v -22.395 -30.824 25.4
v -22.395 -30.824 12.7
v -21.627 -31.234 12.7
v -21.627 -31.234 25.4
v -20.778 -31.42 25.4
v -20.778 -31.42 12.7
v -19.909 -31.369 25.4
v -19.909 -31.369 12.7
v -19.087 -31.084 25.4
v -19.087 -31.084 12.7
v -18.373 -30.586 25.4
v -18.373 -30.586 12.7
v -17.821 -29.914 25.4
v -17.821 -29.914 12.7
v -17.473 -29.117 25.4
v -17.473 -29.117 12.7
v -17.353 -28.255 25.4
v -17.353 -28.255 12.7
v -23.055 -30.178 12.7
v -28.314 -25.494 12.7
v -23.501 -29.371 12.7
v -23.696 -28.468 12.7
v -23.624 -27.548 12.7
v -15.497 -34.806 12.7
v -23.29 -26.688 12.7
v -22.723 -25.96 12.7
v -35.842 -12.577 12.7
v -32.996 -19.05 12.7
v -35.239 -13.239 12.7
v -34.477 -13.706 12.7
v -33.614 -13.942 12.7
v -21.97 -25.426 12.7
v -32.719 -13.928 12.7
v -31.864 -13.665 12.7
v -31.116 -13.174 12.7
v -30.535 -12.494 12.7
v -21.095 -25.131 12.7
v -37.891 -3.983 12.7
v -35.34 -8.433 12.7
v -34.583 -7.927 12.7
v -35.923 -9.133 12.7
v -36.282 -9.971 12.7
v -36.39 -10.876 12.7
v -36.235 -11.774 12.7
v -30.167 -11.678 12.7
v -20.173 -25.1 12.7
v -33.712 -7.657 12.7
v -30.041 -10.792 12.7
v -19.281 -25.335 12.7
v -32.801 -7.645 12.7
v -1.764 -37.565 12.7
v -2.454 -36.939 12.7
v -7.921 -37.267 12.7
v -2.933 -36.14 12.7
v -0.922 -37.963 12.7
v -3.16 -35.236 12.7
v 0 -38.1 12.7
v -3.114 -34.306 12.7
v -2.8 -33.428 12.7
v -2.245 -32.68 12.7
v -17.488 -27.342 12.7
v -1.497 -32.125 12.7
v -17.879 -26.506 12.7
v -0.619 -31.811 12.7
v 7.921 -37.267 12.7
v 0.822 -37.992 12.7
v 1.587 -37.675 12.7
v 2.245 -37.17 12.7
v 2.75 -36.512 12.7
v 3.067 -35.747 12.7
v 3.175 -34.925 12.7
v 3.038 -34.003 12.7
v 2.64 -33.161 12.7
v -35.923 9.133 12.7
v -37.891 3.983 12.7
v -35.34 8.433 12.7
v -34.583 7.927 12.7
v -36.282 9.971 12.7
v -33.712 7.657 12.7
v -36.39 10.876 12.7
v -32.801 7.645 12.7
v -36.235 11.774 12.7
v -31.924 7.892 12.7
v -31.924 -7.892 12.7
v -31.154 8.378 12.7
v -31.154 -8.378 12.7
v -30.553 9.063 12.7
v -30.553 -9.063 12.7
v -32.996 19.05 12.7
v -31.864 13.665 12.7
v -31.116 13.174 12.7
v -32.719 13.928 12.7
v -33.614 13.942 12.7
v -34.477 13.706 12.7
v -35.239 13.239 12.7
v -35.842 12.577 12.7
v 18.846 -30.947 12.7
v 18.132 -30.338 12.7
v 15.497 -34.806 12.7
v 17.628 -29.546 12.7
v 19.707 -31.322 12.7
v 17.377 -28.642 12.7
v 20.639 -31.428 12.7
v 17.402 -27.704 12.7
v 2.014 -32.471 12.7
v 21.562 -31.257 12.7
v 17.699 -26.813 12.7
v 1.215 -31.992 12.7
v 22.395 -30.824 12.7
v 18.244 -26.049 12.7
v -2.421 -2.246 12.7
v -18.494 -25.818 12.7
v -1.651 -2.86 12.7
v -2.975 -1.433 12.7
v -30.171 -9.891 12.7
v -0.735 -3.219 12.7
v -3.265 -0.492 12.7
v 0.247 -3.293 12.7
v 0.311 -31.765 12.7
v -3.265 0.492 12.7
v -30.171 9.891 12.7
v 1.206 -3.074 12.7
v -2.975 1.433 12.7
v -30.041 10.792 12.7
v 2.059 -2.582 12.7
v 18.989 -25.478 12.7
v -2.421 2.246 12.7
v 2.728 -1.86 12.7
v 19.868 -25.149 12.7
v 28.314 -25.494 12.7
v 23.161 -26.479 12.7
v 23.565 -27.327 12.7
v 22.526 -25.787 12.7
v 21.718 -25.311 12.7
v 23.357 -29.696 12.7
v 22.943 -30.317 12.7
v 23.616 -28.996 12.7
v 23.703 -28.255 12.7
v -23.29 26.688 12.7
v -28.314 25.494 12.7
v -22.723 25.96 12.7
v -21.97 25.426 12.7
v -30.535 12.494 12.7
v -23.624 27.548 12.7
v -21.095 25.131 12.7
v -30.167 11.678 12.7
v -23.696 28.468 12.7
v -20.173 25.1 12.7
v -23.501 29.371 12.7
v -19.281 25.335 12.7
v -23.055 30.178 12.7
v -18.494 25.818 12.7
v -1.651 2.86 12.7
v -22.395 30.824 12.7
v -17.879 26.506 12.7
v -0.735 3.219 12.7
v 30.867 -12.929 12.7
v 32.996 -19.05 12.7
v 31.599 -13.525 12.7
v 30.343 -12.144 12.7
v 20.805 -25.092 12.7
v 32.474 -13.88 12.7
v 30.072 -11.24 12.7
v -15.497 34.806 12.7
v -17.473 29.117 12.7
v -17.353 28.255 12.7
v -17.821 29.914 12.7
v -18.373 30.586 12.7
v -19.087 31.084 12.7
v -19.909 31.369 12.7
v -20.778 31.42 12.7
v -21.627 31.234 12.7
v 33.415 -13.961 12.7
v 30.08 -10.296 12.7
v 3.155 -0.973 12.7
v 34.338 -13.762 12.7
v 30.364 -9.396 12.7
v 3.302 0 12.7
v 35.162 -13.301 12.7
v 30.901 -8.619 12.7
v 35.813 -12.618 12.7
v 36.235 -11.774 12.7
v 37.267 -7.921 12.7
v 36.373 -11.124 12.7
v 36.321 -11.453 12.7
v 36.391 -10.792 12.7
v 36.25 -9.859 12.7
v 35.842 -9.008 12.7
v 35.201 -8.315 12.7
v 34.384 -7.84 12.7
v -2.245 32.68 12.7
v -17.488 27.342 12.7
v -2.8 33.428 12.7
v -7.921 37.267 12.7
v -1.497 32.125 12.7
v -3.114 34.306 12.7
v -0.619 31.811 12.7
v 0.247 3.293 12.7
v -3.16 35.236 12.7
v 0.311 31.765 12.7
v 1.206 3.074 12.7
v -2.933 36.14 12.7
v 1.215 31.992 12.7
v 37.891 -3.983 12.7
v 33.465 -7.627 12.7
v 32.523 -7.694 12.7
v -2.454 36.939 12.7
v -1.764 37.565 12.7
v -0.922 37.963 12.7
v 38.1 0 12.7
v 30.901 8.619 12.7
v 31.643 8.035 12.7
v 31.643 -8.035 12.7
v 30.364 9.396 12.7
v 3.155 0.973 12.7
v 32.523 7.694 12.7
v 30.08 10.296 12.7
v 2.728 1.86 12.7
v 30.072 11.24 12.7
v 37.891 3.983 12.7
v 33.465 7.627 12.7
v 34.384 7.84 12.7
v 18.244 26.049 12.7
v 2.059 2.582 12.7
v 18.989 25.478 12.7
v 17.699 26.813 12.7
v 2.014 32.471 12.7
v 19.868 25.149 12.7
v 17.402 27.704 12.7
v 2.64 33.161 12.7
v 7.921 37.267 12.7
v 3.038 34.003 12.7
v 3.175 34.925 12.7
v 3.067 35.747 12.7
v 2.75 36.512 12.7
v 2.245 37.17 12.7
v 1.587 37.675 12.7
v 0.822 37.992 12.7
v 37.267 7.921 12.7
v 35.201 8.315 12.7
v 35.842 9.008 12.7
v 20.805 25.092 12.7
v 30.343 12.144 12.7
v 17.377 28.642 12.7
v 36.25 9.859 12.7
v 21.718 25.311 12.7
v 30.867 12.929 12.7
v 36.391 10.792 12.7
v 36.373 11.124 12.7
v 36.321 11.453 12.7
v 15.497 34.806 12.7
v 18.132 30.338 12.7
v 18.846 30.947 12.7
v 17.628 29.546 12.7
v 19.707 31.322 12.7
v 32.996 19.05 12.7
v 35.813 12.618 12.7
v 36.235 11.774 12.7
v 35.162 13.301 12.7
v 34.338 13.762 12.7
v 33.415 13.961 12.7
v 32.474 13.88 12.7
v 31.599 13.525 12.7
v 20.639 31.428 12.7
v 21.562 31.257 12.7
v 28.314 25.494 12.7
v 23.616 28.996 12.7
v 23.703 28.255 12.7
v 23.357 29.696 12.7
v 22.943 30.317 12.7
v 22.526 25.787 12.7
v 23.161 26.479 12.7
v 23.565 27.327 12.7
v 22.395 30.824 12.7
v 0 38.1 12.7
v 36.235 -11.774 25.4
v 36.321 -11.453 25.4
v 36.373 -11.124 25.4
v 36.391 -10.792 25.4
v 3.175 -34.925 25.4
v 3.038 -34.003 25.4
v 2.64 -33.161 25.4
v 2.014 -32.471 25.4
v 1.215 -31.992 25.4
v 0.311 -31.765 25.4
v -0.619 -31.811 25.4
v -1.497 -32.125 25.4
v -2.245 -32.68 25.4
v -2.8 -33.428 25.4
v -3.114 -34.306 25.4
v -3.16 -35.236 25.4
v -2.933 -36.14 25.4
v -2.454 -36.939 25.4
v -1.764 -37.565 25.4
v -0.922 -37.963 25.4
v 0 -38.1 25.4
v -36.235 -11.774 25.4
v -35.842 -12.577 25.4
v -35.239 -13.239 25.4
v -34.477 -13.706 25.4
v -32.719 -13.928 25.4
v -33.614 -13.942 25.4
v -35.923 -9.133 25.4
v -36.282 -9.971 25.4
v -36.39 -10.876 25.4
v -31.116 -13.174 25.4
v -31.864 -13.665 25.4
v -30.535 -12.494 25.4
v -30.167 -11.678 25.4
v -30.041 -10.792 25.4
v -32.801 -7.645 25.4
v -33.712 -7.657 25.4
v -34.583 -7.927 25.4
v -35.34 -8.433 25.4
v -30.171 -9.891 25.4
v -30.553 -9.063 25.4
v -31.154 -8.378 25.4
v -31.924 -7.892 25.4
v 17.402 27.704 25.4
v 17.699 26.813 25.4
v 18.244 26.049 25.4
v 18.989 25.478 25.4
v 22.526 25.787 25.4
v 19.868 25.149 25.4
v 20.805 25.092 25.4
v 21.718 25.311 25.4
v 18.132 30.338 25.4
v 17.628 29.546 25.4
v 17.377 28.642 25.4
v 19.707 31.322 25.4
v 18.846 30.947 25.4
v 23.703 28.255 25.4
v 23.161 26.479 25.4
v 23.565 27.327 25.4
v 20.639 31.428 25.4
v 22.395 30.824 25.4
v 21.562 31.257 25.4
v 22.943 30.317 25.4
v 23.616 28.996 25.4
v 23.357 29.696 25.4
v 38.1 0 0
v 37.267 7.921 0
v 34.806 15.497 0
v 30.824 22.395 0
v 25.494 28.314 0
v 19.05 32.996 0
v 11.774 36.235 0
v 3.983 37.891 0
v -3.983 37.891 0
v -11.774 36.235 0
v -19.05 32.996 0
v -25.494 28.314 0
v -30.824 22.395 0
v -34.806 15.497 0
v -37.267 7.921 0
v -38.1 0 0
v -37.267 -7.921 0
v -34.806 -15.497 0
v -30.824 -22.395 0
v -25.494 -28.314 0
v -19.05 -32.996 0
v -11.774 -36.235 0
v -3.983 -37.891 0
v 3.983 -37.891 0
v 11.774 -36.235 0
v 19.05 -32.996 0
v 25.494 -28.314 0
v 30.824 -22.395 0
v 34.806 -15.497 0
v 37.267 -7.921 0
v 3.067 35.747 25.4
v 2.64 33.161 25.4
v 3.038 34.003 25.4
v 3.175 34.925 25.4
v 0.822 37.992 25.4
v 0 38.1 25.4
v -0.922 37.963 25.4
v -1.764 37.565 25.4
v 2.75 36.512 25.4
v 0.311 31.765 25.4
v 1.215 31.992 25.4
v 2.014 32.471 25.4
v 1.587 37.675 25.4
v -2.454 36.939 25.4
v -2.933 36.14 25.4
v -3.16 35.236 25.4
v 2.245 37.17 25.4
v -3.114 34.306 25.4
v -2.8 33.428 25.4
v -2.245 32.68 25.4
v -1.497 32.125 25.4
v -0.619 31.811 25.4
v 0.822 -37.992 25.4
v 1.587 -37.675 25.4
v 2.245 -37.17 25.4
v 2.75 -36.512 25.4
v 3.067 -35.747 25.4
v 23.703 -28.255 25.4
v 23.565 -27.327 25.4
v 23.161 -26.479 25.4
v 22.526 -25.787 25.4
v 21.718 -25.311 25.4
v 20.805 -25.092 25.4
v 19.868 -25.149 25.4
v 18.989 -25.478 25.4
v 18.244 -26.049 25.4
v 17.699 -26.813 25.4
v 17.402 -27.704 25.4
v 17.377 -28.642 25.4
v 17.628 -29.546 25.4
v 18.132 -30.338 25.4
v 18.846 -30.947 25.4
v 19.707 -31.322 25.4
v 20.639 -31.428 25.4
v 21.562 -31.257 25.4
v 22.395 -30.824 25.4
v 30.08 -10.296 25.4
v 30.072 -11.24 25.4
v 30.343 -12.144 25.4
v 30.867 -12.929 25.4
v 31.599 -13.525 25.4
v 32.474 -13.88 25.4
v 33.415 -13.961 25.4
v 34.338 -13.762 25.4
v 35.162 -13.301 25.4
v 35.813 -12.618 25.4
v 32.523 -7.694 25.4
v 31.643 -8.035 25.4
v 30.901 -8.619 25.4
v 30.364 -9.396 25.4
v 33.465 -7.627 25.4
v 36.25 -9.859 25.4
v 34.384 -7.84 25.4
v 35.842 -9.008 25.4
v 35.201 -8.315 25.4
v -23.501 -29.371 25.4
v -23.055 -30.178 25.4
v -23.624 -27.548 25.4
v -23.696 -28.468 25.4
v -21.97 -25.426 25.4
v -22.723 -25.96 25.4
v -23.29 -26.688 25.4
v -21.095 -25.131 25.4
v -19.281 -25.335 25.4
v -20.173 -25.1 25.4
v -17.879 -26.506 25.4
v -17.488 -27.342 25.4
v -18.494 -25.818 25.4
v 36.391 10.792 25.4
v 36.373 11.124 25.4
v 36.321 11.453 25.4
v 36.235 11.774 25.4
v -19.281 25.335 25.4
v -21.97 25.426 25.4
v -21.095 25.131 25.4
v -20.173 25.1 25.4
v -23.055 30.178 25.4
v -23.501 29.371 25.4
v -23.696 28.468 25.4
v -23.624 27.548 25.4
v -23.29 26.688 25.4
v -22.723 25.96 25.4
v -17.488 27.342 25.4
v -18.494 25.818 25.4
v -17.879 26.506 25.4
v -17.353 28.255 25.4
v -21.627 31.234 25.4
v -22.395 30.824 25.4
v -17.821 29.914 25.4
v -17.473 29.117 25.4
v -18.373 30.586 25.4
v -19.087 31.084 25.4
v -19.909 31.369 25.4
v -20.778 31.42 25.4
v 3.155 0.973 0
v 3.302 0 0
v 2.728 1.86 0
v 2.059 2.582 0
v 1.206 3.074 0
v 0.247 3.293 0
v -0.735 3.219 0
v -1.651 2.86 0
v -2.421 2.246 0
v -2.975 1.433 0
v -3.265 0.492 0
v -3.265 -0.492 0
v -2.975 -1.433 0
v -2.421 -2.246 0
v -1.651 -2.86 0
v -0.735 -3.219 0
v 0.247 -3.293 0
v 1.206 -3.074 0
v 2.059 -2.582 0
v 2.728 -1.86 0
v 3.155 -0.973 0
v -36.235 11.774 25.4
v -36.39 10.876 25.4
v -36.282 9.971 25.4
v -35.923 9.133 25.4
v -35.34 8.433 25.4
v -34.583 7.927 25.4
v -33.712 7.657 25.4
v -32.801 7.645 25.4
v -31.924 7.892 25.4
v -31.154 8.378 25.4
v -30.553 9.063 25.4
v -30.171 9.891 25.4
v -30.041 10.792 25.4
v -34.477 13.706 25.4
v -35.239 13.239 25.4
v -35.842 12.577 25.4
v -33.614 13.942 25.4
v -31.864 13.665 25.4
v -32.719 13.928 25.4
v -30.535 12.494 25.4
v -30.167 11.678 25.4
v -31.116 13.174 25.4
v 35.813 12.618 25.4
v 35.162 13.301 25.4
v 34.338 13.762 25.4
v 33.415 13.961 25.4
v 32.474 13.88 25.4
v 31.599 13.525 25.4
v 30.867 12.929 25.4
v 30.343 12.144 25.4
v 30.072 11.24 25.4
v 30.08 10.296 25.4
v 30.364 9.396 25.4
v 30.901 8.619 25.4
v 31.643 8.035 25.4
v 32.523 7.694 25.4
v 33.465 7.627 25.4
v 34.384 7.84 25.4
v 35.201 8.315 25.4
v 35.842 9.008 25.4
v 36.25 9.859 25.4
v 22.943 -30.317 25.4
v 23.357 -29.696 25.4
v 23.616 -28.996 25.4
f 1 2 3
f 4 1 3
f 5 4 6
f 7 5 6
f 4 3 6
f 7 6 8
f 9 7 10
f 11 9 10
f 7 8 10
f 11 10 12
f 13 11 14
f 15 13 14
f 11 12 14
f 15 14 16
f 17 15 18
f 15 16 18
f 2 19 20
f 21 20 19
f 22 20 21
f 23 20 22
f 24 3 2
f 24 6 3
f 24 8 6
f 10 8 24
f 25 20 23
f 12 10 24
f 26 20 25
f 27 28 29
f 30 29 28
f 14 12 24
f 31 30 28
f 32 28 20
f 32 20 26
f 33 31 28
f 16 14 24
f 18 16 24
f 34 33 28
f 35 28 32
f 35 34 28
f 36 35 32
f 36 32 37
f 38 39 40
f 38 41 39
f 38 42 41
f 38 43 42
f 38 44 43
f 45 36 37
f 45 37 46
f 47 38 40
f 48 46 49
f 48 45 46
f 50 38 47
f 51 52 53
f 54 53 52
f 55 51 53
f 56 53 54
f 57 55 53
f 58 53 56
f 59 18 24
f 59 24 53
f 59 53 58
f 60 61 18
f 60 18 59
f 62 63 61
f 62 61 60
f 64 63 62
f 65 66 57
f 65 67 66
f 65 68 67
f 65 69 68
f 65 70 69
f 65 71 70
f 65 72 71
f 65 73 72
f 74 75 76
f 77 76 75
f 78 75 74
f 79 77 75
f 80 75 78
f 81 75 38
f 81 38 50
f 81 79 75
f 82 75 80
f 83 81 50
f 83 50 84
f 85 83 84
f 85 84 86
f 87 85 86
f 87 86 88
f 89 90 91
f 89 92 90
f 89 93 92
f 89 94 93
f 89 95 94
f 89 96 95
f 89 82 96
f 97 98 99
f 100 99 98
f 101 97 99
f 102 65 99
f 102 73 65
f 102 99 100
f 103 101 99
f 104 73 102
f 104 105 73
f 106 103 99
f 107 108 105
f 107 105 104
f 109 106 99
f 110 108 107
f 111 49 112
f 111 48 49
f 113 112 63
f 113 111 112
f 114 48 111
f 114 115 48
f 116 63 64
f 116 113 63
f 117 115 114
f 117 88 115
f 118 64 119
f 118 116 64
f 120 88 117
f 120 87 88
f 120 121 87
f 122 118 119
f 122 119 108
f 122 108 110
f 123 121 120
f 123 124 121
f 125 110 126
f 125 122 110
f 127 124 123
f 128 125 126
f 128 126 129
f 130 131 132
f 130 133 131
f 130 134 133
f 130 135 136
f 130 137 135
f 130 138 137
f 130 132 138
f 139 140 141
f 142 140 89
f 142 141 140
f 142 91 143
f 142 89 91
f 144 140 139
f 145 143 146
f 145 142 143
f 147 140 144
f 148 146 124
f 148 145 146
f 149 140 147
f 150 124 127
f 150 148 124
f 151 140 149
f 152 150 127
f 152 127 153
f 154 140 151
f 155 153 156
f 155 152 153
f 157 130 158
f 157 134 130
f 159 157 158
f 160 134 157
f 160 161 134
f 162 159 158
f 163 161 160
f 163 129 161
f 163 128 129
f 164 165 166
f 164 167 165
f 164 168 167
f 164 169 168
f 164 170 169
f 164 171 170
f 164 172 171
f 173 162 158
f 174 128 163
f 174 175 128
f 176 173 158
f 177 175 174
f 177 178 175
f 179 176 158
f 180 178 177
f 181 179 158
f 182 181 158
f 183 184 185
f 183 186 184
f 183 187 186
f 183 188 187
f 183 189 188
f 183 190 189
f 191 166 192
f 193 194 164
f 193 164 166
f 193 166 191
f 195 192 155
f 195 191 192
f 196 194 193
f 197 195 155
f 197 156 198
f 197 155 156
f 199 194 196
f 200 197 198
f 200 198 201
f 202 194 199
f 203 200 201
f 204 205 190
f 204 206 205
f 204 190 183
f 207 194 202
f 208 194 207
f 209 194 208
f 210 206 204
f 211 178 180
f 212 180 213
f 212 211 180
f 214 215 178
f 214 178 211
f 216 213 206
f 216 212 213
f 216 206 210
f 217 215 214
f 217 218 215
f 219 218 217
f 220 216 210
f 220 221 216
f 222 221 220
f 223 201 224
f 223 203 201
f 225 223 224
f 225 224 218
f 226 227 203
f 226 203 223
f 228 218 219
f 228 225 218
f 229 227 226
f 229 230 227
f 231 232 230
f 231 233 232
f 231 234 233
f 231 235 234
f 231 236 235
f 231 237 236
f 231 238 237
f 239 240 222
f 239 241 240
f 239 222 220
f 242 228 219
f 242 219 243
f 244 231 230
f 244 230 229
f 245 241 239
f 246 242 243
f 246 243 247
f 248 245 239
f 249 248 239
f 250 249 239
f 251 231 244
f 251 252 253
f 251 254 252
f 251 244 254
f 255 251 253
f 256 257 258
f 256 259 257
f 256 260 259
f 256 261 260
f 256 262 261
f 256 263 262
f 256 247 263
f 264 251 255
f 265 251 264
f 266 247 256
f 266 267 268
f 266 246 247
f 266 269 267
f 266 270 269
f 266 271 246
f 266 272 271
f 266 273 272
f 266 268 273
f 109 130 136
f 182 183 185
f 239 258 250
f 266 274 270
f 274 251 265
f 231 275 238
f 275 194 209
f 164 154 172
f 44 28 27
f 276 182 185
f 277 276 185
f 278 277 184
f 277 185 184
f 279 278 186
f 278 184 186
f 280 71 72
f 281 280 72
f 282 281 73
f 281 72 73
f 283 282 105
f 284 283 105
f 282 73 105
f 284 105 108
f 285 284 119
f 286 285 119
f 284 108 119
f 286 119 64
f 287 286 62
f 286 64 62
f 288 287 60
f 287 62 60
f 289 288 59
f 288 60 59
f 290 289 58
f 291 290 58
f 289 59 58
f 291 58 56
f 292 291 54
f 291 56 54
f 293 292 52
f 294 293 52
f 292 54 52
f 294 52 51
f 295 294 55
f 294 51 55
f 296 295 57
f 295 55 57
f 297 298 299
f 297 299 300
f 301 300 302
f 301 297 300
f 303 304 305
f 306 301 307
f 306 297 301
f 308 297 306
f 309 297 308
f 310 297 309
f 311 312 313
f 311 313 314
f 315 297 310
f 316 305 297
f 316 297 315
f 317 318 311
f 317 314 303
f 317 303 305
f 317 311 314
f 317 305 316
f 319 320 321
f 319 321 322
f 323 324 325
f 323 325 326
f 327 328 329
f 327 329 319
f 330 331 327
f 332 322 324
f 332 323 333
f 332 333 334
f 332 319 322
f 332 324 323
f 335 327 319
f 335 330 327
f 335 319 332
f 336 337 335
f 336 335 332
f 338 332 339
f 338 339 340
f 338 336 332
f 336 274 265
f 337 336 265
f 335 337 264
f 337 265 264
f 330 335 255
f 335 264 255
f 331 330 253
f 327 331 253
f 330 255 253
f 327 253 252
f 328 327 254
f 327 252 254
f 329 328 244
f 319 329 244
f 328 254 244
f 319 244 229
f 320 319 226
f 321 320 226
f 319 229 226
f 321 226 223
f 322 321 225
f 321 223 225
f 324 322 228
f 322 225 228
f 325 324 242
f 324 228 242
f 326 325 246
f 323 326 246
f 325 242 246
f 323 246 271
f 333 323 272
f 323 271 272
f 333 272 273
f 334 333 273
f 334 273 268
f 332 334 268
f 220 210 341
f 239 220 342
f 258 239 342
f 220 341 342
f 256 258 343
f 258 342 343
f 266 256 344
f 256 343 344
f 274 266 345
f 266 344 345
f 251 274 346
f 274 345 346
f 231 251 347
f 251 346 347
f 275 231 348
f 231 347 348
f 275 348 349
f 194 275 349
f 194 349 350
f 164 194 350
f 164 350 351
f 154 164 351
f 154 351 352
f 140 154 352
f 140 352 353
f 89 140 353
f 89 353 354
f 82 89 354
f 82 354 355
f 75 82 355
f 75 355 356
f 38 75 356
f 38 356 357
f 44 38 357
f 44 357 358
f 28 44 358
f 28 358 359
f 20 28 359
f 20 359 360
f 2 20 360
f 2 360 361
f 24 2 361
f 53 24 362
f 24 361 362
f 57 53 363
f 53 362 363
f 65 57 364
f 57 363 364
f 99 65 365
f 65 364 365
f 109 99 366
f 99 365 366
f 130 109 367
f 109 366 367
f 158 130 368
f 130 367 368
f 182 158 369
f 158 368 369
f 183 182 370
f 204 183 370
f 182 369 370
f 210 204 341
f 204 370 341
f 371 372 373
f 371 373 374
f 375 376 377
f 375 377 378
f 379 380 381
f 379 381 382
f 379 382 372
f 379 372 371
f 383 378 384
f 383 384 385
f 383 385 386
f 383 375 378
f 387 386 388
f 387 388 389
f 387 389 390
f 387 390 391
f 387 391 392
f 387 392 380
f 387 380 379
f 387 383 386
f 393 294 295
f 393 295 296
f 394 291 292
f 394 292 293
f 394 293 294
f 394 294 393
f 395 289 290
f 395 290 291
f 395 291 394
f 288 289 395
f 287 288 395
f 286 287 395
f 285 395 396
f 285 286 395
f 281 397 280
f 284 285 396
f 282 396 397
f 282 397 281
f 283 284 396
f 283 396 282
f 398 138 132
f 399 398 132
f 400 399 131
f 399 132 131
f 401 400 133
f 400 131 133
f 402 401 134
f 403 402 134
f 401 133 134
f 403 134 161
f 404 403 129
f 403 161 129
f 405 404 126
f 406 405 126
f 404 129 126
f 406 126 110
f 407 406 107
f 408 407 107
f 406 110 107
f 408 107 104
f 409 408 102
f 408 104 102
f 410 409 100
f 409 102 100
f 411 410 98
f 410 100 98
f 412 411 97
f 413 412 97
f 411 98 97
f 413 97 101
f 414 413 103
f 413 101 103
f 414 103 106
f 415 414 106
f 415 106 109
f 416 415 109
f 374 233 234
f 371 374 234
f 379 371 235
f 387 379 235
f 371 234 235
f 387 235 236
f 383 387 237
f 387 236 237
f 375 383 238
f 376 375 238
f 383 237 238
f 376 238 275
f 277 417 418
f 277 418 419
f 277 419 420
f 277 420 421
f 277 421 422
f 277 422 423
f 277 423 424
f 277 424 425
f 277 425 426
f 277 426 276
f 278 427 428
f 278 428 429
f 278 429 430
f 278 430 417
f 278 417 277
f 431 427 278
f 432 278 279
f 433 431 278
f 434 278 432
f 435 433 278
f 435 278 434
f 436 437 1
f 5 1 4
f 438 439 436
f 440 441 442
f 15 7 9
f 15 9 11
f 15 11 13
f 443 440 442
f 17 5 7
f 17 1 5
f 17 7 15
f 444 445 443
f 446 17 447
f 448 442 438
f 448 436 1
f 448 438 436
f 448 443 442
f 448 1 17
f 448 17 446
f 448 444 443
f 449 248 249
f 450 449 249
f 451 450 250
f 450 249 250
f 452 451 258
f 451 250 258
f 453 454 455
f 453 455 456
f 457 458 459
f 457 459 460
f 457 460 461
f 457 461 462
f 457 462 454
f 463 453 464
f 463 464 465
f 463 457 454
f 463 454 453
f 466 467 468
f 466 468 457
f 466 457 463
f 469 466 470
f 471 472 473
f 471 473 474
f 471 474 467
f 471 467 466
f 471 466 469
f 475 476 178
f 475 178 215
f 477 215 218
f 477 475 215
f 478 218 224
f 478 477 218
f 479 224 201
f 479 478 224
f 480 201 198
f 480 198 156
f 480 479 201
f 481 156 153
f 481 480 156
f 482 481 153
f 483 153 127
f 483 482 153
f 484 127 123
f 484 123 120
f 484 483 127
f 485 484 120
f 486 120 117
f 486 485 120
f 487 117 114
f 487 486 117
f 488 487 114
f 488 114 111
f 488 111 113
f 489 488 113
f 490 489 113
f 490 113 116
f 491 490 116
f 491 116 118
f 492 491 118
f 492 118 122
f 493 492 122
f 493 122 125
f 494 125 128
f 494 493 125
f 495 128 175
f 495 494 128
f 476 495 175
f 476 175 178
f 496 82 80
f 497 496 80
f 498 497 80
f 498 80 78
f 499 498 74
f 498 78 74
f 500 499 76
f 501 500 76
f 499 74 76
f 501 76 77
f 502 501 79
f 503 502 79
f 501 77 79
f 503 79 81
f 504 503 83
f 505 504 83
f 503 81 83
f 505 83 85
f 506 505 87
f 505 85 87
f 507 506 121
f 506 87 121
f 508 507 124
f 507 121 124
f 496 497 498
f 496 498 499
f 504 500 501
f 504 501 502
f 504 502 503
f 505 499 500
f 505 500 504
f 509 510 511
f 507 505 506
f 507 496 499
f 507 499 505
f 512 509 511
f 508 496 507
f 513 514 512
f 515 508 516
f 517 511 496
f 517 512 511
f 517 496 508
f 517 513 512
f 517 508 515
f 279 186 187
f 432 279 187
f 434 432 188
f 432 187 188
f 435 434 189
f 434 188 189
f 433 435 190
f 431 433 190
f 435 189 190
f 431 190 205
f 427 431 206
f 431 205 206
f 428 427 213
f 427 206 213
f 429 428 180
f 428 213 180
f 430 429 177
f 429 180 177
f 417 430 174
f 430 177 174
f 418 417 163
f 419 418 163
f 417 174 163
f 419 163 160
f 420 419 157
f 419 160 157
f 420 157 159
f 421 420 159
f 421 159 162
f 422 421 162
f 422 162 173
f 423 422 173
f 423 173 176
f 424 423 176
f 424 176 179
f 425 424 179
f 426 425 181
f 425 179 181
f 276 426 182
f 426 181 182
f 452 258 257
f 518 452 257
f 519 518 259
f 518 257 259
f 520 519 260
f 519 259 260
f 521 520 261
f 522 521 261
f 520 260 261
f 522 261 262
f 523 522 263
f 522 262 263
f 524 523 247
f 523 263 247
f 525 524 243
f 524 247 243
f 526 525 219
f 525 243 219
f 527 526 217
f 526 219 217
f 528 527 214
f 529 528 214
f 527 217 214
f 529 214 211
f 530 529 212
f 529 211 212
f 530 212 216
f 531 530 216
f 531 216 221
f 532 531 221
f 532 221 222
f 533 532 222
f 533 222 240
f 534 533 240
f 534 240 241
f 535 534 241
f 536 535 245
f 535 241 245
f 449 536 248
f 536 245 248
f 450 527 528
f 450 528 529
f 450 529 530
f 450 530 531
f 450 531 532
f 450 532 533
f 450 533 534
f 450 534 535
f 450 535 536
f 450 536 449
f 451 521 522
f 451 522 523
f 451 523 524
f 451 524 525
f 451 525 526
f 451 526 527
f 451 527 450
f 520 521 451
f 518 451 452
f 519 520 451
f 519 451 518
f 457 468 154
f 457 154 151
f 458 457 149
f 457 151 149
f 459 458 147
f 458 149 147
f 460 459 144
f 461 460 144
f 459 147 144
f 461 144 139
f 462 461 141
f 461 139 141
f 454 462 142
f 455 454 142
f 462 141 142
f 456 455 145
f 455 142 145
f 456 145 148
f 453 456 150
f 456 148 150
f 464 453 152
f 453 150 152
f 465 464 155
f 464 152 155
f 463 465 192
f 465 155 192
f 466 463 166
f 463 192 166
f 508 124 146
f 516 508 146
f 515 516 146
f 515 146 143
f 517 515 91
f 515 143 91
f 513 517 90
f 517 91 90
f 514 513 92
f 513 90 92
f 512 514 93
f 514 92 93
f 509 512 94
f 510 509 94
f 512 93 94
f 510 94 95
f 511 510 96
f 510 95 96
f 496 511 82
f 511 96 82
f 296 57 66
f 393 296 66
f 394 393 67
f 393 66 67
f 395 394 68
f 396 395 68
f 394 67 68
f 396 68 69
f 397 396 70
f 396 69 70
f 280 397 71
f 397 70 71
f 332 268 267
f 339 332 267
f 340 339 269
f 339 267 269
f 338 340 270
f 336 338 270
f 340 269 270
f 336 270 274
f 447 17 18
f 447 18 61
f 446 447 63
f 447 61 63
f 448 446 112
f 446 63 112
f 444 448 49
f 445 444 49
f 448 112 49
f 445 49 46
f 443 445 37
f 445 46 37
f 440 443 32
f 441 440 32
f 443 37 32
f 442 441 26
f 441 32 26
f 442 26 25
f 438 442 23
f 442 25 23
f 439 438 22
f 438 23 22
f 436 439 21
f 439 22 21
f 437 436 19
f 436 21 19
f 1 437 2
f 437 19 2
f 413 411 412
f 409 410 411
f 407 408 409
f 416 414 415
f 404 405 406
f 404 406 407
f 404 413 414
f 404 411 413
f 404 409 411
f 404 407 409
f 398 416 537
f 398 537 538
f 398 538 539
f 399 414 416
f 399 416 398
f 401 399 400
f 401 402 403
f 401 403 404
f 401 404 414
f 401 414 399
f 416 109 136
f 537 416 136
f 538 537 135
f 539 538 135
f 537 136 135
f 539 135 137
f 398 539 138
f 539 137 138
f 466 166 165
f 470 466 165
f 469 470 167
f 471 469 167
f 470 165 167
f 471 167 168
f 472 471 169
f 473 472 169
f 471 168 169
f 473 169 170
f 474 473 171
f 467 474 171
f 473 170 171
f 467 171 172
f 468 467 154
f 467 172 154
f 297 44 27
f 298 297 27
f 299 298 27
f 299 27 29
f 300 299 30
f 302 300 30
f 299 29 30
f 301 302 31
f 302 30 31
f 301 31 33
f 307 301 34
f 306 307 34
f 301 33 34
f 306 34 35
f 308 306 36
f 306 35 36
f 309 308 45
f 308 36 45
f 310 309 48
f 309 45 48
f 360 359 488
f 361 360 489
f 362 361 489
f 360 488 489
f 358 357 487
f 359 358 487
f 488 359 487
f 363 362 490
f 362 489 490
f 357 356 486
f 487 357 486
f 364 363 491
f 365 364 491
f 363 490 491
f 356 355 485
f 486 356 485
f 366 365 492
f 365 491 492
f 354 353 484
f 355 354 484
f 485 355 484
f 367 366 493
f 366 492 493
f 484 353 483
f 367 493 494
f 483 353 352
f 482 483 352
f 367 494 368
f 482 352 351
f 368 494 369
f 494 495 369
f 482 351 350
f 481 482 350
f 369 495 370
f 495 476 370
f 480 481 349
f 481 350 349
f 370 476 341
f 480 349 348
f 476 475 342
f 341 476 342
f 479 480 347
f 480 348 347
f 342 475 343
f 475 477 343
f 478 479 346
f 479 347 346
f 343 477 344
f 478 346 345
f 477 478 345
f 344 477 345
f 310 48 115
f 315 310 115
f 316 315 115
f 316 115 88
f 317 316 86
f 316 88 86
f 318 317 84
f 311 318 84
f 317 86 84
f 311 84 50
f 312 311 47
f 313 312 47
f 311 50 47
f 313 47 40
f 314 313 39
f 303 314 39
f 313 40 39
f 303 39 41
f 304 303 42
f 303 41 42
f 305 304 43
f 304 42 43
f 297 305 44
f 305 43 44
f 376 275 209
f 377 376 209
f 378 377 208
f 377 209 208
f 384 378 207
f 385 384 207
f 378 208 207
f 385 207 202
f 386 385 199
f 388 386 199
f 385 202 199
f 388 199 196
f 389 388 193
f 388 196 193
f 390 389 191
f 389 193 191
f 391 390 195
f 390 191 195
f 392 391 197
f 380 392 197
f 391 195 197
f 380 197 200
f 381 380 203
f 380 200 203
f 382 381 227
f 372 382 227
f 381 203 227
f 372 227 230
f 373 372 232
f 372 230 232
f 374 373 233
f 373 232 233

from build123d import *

# Parameters (mm, degrees)
F0_R     = 38.1
F0_R_2   = 3.302
F1_DEPTH = 12.7
F3_DEPTH = 12.7
F4_DEPTH = 12.7


with BuildPart() as f1:
    # F0 (on Top) → F1 (new body)
    with BuildSketch(Plane.XY):
        Circle(F0_R)
        Circle(F0_R_2, mode=Mode.SUBTRACT)
    extrude(amount=F1_DEPTH)

    # F2 (on face) → F3 (join)
    with BuildSketch(Plane.XY.offset(12.7)):
        with BuildLine():
            ThreePointArc((23.7034, 28.254919), (23.357346, 29.696338), (22.394618, 30.823547))
            ThreePointArc((22.394618, 30.823547), (17.699454, 26.813499), (23.7034, 28.254919))
        make_face()
        with BuildLine():
            ThreePointArc((36.390649, 10.792419), (36.351559, 11.289098), (36.235253, 11.773548))
            ThreePointArc((36.235253, 11.773548), (30.079738, 10.295739), (36.390649, 10.792419))
        make_face()
        with BuildLine():
            ThreePointArc((36.390649, -10.792419), (30.079738, -10.295739), (36.235253, -11.773548))
            ThreePointArc((36.235253, -11.773548), (36.351559, -11.289098), (36.390649, -10.792419))
        make_face()
        with BuildLine():
            ThreePointArc((23.7034, -28.254919), (17.699454, -26.813499), (22.394618, -30.823547))
            ThreePointArc((22.394618, -30.823547), (23.357346, -29.696338), (23.7034, -28.254919))
        make_face()
    extrude(amount=F3_DEPTH)

    # F2 (on face) → F4 (join)
    with BuildSketch(Plane.XY.offset(12.7)):
        with BuildLine():
            ThreePointArc((0, 38.1), (-2.245064, 32.679936), (3.175, 34.925))
            ThreePointArc((3.175, 34.925), (2.245064, 37.170064), (0, 38.1))
        make_face()
        with BuildLine():
            ThreePointArc((-17.3534, 28.254919), (-19.08698, 31.083864), (-22.394618, 30.823547))
            ThreePointArc((-22.394618, 30.823547), (-21.96982, 25.425973), (-17.3534, 28.254919))
        make_face()
        with BuildLine():
            ThreePointArc((-30.040649, 10.792419), (-32.718969, 13.928329), (-36.235253, 11.773547))
            ThreePointArc((-36.235253, 11.773547), (-33.712328, 7.656508), (-30.040649, 10.792419))
        make_face()
        with BuildLine():
            ThreePointArc((-30.040649, -10.792419), (-33.712328, -7.656508), (-36.235253, -11.773547))
            ThreePointArc((-36.235253, -11.773547), (-32.71897, -13.928329), (-30.040649, -10.792419))
        make_face()
        with BuildLine():
            ThreePointArc((-17.3534, -28.254919), (-21.96982, -25.425973), (-22.394618, -30.823547))
            ThreePointArc((-22.394618, -30.823547), (-19.08698, -31.083864), (-17.3534, -28.254919))
        make_face()
        with BuildLine():
            ThreePointArc((3.175, -34.925), (-2.245064, -32.679936), (0, -38.1))
            ThreePointArc((0, -38.1), (2.245064, -37.170064), (3.175, -34.925))
        make_face()
    extrude(amount=F4_DEPTH)


solid = f1.part
